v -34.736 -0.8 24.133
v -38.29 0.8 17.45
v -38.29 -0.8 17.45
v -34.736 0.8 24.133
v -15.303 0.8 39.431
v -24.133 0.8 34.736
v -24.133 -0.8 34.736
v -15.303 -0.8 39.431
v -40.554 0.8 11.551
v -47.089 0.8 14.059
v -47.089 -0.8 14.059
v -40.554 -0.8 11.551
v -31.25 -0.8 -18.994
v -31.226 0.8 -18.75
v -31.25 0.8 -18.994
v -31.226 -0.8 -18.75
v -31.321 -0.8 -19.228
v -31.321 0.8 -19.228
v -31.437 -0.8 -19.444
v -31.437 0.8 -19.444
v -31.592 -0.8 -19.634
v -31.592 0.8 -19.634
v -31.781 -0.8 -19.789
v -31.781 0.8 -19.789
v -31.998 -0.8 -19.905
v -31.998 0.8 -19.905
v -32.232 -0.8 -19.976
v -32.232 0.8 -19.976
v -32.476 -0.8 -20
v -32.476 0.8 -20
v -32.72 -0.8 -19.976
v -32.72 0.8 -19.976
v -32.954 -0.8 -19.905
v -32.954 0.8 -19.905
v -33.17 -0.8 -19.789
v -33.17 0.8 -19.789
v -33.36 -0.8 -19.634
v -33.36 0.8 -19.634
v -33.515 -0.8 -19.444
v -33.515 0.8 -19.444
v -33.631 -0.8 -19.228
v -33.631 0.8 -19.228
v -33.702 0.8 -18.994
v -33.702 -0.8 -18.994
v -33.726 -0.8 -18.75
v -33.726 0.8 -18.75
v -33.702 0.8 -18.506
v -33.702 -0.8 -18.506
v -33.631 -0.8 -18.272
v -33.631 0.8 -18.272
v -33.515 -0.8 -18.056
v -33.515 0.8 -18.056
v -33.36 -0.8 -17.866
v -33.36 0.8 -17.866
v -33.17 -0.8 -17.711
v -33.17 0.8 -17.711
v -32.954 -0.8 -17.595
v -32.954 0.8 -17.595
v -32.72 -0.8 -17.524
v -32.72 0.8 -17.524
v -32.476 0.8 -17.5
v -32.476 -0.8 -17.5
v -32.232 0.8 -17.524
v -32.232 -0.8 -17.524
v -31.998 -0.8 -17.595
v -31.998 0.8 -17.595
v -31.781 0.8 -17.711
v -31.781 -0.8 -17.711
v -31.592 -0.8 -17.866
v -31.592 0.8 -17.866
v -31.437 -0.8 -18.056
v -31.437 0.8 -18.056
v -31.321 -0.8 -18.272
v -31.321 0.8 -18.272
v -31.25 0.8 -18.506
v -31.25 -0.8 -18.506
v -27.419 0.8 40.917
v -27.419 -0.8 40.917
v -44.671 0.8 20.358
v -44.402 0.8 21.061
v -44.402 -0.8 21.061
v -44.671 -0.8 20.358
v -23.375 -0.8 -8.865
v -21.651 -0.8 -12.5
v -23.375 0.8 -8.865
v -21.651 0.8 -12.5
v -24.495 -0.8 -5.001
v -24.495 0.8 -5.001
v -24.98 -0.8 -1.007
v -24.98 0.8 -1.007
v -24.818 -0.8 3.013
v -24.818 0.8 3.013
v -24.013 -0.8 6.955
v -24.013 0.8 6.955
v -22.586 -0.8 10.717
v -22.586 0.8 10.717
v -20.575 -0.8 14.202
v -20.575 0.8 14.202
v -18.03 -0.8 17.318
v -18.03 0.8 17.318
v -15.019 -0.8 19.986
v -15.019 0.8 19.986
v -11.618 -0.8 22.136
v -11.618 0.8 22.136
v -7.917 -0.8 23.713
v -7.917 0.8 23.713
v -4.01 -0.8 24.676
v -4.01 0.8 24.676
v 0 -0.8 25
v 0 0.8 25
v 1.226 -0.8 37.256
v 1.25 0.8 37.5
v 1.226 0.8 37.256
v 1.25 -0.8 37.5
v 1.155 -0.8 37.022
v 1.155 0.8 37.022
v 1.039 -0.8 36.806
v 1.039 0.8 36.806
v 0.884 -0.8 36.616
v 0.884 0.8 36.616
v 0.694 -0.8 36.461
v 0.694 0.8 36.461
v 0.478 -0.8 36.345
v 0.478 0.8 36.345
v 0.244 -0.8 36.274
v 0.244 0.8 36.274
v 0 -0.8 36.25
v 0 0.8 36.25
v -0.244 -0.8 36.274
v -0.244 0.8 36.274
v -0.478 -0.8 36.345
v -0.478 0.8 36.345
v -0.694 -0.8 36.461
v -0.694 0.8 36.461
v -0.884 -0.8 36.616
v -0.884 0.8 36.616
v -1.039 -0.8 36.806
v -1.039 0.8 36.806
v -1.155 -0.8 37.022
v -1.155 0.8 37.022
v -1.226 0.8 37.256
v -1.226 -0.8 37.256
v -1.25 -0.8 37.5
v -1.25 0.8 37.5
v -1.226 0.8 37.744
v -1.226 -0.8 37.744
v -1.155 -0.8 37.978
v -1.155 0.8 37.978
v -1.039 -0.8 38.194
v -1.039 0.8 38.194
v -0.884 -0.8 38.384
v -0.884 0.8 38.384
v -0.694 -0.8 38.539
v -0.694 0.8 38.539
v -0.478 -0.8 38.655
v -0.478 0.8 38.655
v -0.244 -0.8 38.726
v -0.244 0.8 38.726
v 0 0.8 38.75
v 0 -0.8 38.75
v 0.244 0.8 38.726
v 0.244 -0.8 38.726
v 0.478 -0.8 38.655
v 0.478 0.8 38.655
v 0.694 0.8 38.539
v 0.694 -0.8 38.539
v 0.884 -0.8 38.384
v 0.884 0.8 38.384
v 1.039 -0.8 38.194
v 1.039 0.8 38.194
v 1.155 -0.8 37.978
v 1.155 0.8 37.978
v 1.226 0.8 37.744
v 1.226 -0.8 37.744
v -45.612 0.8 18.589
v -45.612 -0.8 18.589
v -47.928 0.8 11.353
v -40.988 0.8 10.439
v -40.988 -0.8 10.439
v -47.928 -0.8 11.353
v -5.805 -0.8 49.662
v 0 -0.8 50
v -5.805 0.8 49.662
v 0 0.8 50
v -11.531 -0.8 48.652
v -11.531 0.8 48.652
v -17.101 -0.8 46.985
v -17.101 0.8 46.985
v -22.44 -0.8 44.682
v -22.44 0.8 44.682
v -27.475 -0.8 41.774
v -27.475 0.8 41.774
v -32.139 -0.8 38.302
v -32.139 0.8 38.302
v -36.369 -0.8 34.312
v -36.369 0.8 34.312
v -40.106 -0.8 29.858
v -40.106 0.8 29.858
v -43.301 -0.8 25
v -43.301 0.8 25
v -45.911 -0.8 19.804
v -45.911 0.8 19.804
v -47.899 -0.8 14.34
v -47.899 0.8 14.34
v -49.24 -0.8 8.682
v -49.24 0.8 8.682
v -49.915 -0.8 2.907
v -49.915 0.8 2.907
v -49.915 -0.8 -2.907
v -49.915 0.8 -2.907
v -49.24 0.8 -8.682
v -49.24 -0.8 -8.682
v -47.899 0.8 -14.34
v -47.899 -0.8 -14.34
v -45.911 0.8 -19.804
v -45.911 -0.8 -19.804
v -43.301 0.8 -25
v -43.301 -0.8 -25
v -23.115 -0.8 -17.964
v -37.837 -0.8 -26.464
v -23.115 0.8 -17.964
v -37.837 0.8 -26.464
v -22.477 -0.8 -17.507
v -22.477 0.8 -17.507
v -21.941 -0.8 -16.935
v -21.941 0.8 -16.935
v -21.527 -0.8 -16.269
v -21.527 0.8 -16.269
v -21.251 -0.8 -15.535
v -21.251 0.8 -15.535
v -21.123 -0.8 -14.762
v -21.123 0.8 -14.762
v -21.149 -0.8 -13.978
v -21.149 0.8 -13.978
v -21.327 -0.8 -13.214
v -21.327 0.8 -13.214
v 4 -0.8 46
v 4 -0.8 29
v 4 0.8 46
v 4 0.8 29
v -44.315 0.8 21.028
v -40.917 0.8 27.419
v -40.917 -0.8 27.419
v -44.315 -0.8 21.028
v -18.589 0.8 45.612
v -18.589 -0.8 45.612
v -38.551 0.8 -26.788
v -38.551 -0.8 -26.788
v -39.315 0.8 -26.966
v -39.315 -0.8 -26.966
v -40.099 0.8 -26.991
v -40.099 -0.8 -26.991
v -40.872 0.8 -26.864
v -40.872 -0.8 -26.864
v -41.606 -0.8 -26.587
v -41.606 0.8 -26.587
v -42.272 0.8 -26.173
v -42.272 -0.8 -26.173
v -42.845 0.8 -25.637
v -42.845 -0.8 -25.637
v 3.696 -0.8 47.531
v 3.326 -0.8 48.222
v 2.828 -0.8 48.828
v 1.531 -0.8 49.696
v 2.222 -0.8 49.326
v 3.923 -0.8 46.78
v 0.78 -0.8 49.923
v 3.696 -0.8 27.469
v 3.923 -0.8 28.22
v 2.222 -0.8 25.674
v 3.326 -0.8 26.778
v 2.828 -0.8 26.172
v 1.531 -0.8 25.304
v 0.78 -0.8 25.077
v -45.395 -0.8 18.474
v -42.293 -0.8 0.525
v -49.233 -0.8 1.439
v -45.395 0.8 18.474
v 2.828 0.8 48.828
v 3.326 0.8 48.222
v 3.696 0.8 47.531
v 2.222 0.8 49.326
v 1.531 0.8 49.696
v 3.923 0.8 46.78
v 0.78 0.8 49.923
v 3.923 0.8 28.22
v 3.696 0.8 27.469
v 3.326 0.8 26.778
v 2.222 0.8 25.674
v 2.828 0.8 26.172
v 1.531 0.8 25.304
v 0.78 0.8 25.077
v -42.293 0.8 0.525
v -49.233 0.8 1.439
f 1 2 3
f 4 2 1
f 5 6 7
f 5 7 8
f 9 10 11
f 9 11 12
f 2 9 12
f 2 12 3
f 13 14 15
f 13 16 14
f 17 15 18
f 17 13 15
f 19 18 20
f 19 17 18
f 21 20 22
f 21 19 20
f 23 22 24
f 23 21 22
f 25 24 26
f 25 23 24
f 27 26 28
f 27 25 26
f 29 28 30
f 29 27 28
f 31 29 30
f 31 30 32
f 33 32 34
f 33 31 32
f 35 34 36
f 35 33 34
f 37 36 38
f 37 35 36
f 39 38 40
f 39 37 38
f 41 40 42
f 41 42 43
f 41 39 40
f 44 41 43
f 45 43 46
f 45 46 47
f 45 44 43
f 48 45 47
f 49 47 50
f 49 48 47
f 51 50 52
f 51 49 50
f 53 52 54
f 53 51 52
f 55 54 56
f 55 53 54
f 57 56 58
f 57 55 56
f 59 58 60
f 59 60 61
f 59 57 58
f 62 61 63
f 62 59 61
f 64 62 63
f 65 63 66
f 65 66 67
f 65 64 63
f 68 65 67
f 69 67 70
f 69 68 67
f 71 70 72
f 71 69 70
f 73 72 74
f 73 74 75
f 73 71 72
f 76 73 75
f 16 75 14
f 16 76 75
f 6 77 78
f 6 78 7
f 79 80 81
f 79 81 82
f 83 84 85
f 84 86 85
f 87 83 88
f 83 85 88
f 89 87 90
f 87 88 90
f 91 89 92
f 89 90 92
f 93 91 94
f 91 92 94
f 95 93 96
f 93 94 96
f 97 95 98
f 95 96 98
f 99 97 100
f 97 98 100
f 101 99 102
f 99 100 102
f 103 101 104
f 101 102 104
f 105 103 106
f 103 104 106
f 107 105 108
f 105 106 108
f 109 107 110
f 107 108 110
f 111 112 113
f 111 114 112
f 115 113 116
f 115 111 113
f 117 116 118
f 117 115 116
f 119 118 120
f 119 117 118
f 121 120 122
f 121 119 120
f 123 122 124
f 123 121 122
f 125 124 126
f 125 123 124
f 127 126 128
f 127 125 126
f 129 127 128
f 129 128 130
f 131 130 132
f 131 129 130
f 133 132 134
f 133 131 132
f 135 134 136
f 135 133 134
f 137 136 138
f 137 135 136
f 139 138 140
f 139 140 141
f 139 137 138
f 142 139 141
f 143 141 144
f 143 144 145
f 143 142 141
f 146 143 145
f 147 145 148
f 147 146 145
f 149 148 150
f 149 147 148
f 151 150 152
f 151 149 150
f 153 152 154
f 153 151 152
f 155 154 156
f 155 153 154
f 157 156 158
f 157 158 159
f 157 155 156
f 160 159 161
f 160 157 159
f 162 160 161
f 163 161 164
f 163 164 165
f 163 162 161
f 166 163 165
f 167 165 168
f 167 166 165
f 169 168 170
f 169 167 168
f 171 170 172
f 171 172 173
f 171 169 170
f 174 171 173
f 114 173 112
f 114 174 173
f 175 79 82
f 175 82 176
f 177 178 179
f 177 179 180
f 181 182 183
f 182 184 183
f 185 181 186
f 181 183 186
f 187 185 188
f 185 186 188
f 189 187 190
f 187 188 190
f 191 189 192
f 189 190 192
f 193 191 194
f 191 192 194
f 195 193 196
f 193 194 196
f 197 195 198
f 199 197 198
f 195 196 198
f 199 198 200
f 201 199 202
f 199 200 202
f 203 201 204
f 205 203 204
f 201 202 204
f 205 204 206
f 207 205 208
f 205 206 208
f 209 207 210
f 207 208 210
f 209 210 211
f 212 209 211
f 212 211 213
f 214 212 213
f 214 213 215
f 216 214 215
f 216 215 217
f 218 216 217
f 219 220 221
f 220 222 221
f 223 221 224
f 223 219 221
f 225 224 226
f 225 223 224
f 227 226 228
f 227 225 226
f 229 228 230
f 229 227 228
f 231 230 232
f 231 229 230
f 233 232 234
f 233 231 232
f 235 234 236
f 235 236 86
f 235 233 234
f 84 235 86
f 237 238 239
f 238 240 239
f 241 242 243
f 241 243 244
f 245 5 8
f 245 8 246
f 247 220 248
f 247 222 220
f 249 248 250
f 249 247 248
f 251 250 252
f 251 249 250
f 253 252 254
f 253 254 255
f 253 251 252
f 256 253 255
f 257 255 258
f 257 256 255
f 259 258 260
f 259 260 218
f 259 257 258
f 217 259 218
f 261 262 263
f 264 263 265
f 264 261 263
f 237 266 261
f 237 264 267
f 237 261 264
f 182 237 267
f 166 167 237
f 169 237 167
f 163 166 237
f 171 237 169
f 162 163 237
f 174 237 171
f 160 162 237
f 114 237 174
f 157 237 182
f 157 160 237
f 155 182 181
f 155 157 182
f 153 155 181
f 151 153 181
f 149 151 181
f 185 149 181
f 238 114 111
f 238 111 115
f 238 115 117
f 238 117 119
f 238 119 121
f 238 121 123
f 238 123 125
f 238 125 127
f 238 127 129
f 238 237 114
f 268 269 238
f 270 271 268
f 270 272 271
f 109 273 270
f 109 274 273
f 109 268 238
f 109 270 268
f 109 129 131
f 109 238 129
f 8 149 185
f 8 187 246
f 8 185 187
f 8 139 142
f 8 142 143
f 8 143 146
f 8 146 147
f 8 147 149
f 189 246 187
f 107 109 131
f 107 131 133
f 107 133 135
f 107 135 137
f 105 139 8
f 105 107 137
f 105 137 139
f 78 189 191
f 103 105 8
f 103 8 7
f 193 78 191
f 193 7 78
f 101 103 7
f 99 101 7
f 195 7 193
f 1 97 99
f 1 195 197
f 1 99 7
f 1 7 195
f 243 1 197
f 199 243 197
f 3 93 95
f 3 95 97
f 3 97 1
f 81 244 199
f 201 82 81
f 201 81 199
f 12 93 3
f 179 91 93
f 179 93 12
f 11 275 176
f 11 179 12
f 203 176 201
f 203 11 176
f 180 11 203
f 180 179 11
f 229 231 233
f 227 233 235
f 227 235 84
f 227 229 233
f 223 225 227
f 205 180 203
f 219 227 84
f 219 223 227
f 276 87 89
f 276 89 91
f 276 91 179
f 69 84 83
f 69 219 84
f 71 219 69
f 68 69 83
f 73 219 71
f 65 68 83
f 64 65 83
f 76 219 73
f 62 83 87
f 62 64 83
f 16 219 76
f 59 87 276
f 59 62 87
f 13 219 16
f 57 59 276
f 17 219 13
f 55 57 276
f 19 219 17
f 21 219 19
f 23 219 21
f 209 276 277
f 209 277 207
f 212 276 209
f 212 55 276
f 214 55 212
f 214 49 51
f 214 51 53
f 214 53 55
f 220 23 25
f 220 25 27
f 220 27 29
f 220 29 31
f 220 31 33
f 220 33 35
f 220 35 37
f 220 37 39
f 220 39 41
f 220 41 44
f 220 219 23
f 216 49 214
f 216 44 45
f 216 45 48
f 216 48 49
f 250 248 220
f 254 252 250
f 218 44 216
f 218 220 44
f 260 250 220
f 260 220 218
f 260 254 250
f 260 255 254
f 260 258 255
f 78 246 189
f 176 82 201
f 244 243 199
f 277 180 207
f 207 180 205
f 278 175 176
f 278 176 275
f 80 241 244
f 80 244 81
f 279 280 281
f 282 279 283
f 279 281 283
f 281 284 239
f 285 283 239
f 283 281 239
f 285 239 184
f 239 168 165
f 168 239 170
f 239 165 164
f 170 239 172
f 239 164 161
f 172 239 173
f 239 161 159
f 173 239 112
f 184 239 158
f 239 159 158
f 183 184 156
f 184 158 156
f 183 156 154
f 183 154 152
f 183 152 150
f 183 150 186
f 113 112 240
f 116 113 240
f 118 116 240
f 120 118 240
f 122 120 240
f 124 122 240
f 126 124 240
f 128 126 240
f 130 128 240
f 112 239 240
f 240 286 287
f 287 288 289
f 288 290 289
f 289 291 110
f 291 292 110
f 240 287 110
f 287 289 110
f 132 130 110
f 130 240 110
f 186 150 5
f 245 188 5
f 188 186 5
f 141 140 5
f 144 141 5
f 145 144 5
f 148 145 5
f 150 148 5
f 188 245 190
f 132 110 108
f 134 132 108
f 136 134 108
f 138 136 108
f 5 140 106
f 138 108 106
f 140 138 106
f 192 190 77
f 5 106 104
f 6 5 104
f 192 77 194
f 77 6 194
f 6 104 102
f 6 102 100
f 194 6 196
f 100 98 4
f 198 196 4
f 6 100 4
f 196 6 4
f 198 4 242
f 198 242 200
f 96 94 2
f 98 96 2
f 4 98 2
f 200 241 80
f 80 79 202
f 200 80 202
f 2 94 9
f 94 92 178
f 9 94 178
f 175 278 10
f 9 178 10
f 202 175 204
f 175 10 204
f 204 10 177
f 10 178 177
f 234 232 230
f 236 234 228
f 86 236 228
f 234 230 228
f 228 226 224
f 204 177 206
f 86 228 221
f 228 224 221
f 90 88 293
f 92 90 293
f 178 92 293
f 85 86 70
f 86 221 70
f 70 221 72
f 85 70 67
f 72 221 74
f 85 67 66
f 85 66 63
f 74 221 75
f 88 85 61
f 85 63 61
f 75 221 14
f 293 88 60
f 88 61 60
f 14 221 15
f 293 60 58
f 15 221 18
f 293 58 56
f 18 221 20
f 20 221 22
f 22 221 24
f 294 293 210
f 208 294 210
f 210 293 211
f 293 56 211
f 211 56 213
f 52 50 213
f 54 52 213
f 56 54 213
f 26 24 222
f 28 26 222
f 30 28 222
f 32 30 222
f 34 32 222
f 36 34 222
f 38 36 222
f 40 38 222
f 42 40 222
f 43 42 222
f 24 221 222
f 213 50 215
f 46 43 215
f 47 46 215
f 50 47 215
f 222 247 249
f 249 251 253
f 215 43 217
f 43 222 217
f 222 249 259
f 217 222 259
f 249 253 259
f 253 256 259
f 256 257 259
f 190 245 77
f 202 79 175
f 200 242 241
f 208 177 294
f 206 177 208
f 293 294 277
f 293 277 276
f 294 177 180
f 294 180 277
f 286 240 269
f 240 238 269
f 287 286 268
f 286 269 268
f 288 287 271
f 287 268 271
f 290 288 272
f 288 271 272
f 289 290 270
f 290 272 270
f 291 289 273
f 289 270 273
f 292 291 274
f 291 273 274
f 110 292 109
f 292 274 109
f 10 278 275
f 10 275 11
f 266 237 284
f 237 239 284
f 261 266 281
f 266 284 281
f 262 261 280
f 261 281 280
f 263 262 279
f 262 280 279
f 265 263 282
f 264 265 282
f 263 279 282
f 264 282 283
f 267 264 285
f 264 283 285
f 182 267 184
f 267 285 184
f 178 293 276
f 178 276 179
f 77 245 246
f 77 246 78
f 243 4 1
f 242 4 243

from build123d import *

# Parameters (mm, degrees)
SKETCH3_R               = 1.25
BOSS_EXTRUDE2_DEPTH     = 0.8
CUT_EXTRUDE1_DEPTH      = 1.8
CUT_EXTRUDE1_DEPTH_BACK = 1.8
FILLET1_R               = 4


with BuildPart() as part:
    # Sketch3 → Boss-Extrude2 (new body, symmetric)
    with BuildSketch(Plane(origin=(0, 0, 0), x_dir=(1, 0, 0), z_dir=(0, 1, 0))):
        with BuildLine():
            Line((-41.16248371, 28.383973204), (-19.371710273, 15.803064294))
            ThreePointArc((-19.371710273, 15.803064294), (-21.650635095, -12.5), (4, -24.677925359))
            Line((4, -24.677925359), (4, -49.839743178))
            ThreePointArc((4, -49.839743178), (-43.301270189, -25), (-41.16248371, 28.383973204))
        make_face()
        with Locations((-32.475952642, 18.75)):
            Circle(SKETCH3_R, mode=Mode.SUBTRACT)
        with Locations((0, -37.5)):
            Circle(SKETCH3_R, mode=Mode.SUBTRACT)
    extrude(amount=BOSS_EXTRUDE2_DEPTH, both=True)

    # Sketch4 → Cut-Extrude1 (cut, two sides)
    with BuildSketch(Plane(origin=(0, 0, 0), x_dir=(1, 0, 0), z_dir=(0, 1, 0))) as cut_extrude1_sk:
        Polygon((-24.132543601, -34.736441086), (-15.303067673, -39.431156714), (-18.589368612, -45.611789864), (-27.418844541, -40.917074236), align=None)
        Polygon((-39.431156714, -15.303067673), (-34.736441086, -24.132543601), (-40.917074236, -27.418844541), (-45.611789864, -18.589368612), align=None)
        Polygon((-40.554257724, -11.550527282), (-37.866498102, -18.55238048), (-44.401561088, -21.060956127), (-47.089320709, -14.059102928), align=None)
        Polygon((-42.293315139, -0.524875766), (-40.988053217, -10.43932438), (-47.928167246, -11.353007726), (-49.233429168, -1.438559112), align=None)
    extrude(amount=CUT_EXTRUDE1_DEPTH, mode=Mode.SUBTRACT)
    extrude(cut_extrude1_sk.sketch, amount=-CUT_EXTRUDE1_DEPTH_BACK, mode=Mode.SUBTRACT)

    # Fillet1
    fillet1_edges = [part.edges().sort_by_distance(p)[0] for p in [
        (-41.16248371, 0, -28.383973204),
        (-19.371710273, 0, -15.803064294),
        (4, 0, 24.677925359),
        (4, 0, 49.839743178),
    ]]
    fillet(fillet1_edges, radius=FILLET1_R)


solid = part.part
